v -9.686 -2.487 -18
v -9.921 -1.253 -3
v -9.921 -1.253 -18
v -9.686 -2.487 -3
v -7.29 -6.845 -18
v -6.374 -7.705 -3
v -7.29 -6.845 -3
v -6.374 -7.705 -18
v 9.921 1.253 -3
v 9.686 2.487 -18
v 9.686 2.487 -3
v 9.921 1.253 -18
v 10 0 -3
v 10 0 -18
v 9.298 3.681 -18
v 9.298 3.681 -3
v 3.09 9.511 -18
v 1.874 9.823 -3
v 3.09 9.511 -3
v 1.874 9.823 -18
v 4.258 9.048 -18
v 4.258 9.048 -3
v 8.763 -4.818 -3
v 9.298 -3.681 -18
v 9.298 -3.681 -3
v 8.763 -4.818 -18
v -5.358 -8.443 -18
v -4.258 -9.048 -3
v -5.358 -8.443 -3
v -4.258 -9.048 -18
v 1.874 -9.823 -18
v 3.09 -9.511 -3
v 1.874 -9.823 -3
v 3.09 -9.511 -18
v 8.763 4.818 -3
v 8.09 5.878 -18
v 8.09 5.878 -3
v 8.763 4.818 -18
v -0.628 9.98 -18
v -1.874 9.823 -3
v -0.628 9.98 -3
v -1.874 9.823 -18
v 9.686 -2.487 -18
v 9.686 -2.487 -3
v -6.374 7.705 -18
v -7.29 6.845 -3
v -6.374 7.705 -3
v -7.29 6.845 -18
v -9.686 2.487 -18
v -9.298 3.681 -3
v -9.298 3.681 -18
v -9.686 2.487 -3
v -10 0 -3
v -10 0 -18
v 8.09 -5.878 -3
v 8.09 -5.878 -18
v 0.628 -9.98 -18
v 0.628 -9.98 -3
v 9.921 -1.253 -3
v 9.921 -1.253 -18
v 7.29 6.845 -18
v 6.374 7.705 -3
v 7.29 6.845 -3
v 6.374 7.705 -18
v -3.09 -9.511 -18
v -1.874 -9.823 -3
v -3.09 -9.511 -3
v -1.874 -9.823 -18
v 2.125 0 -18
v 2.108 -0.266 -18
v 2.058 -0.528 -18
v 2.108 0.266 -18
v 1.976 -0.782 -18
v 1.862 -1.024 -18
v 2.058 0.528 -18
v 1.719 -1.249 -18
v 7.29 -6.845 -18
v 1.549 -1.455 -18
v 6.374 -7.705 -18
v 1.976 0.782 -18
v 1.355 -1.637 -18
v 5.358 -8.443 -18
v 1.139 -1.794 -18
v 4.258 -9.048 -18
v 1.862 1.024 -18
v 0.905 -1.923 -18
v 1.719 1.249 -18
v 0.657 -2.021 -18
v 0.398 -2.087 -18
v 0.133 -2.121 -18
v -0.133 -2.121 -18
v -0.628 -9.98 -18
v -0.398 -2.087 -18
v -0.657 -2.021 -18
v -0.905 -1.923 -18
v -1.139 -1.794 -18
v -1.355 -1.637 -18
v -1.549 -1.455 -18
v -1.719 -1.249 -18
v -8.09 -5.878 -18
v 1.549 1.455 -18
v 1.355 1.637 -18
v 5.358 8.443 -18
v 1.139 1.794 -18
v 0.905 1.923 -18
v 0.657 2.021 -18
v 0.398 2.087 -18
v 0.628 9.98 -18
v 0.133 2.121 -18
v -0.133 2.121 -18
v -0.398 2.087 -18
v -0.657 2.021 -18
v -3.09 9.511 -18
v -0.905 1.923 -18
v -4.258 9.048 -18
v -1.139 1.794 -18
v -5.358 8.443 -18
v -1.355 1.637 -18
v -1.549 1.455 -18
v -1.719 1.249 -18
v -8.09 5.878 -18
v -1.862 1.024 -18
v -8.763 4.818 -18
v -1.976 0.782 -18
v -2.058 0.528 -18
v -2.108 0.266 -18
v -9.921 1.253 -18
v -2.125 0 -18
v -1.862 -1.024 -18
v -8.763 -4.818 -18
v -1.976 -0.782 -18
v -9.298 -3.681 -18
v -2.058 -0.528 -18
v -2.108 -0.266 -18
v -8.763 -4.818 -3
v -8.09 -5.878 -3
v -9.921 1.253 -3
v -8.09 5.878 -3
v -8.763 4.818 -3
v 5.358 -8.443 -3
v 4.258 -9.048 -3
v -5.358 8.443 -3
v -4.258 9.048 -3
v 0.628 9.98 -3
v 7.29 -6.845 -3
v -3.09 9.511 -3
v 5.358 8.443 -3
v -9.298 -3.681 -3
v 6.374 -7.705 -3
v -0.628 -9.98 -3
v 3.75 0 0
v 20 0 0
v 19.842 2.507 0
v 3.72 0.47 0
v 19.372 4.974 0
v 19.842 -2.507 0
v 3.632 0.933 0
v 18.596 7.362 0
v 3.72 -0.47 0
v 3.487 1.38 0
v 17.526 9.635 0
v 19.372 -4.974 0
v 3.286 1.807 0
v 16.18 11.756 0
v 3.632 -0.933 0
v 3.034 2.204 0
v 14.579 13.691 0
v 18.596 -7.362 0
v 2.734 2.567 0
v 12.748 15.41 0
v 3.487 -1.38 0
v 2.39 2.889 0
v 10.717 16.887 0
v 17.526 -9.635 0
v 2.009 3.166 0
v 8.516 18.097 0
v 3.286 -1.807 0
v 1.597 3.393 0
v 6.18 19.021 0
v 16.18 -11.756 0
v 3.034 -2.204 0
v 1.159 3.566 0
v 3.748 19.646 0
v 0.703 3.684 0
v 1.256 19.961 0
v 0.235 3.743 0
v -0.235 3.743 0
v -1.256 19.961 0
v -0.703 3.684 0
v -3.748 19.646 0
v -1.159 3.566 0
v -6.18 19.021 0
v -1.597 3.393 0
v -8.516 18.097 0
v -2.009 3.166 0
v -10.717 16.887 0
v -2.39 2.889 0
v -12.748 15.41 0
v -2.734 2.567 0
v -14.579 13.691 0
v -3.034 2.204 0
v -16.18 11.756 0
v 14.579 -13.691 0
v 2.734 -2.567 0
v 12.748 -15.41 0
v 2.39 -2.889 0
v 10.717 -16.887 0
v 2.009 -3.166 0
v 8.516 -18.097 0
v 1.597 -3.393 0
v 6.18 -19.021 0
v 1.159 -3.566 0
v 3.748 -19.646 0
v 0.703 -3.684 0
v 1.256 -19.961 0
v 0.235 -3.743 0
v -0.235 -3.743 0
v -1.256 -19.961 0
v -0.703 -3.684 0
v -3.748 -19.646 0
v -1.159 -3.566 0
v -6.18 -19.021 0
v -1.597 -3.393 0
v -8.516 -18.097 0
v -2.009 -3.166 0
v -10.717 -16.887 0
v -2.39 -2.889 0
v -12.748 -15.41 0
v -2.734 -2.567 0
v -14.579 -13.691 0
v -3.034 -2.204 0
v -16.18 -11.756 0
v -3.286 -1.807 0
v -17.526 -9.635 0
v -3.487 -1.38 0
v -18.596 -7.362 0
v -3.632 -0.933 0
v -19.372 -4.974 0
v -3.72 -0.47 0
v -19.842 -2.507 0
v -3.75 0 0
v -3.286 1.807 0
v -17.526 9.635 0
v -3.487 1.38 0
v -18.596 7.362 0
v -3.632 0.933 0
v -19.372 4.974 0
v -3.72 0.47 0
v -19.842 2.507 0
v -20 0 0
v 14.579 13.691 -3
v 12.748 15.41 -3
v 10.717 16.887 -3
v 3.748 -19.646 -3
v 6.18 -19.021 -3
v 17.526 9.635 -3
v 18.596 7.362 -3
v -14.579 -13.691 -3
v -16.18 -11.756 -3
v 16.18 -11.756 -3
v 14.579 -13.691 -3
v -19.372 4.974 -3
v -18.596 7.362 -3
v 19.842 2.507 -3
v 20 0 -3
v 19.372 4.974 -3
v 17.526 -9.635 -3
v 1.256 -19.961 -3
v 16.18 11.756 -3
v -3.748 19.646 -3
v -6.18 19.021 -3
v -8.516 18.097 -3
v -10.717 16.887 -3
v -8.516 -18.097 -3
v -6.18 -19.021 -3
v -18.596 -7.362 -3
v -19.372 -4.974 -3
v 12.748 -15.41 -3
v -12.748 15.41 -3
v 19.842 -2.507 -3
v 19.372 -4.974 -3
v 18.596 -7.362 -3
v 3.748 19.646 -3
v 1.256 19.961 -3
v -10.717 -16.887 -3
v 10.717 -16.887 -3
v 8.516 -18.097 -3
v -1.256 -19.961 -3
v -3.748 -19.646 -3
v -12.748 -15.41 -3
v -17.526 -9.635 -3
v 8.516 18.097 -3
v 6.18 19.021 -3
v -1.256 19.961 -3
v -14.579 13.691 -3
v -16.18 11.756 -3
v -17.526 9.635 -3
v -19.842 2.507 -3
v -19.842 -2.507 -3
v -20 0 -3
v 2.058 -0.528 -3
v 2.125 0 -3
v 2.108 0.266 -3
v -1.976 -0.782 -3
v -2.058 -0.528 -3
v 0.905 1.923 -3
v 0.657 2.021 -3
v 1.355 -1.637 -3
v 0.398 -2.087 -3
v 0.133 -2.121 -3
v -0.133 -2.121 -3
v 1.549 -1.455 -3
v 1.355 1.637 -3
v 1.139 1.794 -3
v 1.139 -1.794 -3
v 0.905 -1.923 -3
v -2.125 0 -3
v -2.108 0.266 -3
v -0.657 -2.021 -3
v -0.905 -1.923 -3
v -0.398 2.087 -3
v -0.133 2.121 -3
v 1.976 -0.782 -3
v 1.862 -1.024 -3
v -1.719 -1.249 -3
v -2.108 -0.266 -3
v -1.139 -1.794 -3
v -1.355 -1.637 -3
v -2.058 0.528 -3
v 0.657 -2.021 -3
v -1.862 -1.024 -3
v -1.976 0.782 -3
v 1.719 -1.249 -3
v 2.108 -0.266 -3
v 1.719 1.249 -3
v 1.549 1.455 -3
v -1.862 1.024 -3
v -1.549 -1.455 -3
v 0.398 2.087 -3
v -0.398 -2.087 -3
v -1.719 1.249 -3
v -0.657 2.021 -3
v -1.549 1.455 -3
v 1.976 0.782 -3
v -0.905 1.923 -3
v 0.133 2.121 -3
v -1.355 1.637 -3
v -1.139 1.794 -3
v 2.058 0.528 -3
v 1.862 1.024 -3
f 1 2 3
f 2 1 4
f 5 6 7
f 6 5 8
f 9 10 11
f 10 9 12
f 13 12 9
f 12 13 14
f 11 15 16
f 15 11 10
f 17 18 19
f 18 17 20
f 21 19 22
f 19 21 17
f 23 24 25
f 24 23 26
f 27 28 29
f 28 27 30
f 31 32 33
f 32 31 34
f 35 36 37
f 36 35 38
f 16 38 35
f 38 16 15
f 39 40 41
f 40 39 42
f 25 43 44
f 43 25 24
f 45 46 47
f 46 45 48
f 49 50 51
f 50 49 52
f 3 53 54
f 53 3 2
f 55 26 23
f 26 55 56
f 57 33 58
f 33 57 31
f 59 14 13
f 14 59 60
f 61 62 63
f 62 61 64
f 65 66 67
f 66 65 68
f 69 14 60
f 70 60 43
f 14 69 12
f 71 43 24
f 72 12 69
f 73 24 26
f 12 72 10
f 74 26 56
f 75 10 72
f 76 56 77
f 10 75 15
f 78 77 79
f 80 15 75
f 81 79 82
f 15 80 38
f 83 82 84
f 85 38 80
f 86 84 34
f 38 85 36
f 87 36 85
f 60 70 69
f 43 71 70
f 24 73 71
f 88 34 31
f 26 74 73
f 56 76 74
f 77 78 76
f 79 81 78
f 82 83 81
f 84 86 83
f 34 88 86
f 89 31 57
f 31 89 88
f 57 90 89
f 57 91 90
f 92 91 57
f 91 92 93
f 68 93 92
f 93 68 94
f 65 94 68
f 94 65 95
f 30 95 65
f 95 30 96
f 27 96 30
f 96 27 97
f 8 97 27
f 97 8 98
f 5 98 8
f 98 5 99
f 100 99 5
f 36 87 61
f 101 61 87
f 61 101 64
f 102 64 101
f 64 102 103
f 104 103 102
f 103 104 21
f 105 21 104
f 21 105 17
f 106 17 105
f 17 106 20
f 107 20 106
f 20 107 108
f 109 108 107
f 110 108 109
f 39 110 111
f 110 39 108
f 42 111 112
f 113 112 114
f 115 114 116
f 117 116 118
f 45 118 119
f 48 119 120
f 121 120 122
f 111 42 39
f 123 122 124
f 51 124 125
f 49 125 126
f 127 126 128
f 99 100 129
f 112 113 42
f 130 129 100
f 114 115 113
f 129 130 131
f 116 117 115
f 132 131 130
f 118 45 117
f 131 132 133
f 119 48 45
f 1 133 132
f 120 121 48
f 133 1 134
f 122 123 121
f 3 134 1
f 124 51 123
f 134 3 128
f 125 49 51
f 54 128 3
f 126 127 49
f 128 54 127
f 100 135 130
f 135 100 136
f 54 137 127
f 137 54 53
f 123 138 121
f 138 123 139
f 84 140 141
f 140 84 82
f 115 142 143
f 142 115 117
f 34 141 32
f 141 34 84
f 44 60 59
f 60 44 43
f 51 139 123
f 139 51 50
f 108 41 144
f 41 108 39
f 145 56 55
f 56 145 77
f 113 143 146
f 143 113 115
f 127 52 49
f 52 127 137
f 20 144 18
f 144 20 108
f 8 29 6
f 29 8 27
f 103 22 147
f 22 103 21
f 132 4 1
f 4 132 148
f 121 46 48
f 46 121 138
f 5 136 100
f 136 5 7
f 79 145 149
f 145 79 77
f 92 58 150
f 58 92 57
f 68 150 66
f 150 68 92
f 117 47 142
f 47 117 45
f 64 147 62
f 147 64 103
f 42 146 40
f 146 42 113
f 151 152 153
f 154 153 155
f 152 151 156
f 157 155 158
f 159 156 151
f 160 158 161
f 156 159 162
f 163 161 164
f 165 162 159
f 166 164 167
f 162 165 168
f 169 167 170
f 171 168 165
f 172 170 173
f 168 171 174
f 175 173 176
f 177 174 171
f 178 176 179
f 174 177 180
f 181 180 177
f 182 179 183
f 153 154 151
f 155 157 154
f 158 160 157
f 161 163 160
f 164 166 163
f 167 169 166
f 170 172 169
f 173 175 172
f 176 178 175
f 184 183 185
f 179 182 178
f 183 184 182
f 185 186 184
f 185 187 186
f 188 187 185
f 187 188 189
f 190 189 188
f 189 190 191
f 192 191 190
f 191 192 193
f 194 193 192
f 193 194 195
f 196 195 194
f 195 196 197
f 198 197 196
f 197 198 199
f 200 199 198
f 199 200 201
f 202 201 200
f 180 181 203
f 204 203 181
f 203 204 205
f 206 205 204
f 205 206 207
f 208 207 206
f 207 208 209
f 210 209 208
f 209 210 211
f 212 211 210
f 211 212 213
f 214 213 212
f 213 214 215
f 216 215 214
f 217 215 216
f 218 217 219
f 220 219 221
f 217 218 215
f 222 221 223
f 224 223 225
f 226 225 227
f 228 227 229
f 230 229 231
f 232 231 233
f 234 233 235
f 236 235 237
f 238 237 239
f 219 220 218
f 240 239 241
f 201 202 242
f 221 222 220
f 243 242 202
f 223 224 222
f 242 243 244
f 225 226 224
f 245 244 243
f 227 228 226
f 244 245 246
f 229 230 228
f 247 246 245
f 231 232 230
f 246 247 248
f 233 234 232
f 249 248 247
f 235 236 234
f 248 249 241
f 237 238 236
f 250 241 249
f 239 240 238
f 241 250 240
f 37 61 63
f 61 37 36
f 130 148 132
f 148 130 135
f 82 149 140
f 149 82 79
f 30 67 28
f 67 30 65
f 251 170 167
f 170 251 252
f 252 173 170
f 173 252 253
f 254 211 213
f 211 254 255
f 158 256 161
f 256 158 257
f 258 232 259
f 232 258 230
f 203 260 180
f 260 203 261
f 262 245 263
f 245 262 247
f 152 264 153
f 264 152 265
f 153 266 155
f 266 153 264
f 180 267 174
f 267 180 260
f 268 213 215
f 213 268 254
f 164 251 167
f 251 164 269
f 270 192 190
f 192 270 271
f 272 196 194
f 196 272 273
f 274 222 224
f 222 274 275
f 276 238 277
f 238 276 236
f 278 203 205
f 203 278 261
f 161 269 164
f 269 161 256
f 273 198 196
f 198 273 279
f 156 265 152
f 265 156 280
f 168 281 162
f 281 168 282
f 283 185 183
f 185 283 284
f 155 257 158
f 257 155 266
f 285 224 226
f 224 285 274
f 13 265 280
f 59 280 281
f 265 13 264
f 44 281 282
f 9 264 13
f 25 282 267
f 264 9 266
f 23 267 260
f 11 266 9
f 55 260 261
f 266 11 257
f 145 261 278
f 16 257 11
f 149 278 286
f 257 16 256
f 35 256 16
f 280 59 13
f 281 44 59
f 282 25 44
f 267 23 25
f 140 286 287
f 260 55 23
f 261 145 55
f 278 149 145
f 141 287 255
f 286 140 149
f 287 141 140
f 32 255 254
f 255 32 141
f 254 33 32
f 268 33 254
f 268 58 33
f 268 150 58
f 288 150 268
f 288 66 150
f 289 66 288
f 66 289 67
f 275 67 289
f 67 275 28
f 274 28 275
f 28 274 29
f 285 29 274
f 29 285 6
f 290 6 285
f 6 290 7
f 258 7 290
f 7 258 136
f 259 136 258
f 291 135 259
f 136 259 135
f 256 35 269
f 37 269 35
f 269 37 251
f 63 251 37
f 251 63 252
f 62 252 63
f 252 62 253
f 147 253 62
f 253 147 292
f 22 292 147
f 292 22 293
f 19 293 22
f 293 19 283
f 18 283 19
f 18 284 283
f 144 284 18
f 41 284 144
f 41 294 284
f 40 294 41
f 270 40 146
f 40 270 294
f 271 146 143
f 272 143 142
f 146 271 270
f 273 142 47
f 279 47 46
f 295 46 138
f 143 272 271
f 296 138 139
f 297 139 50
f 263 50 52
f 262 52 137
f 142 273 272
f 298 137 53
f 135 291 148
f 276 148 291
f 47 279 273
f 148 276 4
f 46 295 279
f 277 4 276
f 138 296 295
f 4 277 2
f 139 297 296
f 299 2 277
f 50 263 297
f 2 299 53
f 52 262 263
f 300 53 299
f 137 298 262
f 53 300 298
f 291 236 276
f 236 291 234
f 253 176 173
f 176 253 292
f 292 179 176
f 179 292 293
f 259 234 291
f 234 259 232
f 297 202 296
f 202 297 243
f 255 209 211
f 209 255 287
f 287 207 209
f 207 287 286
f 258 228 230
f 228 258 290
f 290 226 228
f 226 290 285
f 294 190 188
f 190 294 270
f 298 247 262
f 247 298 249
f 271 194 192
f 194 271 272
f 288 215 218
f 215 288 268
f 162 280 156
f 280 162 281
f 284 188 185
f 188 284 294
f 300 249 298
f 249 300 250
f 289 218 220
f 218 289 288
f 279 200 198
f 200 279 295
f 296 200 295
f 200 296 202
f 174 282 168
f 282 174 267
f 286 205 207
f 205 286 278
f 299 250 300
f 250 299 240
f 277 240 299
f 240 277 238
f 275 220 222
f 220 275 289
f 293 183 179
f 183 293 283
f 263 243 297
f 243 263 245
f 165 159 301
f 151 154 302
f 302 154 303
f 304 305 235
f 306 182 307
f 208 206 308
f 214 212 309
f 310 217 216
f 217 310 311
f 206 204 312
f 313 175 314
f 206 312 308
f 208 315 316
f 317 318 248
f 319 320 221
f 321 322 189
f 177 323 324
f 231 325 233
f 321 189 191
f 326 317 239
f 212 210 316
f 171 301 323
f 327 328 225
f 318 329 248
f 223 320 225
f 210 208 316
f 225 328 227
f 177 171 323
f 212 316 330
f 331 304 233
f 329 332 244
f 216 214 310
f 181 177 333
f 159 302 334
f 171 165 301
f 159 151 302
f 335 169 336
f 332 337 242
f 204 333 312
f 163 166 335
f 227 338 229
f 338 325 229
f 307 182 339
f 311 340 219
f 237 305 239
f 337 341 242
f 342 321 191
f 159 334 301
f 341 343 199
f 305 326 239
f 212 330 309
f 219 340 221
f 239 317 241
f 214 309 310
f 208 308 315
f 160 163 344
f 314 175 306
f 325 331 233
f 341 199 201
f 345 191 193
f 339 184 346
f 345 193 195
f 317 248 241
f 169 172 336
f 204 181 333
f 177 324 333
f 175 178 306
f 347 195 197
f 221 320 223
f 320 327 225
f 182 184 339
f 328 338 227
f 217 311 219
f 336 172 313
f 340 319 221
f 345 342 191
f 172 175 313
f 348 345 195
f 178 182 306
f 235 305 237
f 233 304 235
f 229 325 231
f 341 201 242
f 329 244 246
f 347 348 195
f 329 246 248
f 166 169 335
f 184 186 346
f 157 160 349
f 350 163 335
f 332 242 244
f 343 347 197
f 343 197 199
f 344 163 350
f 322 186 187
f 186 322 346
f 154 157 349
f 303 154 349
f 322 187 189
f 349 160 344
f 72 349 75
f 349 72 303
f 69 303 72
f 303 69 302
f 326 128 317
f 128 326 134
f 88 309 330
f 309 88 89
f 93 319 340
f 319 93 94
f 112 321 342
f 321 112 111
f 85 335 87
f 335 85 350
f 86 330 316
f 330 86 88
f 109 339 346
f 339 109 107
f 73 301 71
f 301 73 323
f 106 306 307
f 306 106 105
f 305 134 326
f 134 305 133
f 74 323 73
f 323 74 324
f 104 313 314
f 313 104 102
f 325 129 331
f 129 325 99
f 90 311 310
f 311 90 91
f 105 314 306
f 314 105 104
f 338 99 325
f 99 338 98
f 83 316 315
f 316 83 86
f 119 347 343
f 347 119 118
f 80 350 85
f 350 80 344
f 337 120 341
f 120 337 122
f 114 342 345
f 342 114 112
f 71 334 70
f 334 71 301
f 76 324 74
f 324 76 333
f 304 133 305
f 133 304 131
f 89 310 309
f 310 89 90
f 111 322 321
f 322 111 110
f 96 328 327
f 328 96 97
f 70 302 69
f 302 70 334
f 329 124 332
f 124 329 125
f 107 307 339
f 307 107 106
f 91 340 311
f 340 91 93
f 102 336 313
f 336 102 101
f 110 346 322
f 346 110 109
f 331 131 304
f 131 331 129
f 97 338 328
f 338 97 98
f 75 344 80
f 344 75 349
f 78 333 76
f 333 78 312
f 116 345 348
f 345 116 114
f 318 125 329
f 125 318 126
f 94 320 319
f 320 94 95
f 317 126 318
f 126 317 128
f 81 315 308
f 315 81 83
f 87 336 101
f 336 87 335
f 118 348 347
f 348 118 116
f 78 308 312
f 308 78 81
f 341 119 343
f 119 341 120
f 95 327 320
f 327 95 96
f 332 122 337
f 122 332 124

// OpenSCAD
$fn = 50;


difference() {
	union() {
		translate(v = [0, 0, -18.0000000000]) {
			cylinder(h = 18, r = 10.0000000000);
		}
		translate(v = [0, 0, -3.0000000000]) {
			cylinder(h = 3, r = 20.0000000000);
		}
	}
	union() {
		translate(v = [0, 0, 0]) {
			rotate(a = [0, 0, 0]) {
				difference() {
					union() {
						#translate(v = [0, 0, -18.0000000000]) {
							cylinder(h = 18, r = 2.0000000000);
						}
						#translate(v = [0, 0, -3]) {
							cylinder(h = 3, r = 10.0000000000, r1 = 2.1250000000, r2 = 3.7500000000);
						}
						#translate(v = [0, 0, -18.0000000000]) {
							cylinder(h = 18, r = 2.1250000000);
						}
						#translate(v = [0, 0, -18.0000000000]) {
							cylinder(h = 18, r = 2.0000000000);
						}
					}
					union();
				}
			}
		}
	}
}
